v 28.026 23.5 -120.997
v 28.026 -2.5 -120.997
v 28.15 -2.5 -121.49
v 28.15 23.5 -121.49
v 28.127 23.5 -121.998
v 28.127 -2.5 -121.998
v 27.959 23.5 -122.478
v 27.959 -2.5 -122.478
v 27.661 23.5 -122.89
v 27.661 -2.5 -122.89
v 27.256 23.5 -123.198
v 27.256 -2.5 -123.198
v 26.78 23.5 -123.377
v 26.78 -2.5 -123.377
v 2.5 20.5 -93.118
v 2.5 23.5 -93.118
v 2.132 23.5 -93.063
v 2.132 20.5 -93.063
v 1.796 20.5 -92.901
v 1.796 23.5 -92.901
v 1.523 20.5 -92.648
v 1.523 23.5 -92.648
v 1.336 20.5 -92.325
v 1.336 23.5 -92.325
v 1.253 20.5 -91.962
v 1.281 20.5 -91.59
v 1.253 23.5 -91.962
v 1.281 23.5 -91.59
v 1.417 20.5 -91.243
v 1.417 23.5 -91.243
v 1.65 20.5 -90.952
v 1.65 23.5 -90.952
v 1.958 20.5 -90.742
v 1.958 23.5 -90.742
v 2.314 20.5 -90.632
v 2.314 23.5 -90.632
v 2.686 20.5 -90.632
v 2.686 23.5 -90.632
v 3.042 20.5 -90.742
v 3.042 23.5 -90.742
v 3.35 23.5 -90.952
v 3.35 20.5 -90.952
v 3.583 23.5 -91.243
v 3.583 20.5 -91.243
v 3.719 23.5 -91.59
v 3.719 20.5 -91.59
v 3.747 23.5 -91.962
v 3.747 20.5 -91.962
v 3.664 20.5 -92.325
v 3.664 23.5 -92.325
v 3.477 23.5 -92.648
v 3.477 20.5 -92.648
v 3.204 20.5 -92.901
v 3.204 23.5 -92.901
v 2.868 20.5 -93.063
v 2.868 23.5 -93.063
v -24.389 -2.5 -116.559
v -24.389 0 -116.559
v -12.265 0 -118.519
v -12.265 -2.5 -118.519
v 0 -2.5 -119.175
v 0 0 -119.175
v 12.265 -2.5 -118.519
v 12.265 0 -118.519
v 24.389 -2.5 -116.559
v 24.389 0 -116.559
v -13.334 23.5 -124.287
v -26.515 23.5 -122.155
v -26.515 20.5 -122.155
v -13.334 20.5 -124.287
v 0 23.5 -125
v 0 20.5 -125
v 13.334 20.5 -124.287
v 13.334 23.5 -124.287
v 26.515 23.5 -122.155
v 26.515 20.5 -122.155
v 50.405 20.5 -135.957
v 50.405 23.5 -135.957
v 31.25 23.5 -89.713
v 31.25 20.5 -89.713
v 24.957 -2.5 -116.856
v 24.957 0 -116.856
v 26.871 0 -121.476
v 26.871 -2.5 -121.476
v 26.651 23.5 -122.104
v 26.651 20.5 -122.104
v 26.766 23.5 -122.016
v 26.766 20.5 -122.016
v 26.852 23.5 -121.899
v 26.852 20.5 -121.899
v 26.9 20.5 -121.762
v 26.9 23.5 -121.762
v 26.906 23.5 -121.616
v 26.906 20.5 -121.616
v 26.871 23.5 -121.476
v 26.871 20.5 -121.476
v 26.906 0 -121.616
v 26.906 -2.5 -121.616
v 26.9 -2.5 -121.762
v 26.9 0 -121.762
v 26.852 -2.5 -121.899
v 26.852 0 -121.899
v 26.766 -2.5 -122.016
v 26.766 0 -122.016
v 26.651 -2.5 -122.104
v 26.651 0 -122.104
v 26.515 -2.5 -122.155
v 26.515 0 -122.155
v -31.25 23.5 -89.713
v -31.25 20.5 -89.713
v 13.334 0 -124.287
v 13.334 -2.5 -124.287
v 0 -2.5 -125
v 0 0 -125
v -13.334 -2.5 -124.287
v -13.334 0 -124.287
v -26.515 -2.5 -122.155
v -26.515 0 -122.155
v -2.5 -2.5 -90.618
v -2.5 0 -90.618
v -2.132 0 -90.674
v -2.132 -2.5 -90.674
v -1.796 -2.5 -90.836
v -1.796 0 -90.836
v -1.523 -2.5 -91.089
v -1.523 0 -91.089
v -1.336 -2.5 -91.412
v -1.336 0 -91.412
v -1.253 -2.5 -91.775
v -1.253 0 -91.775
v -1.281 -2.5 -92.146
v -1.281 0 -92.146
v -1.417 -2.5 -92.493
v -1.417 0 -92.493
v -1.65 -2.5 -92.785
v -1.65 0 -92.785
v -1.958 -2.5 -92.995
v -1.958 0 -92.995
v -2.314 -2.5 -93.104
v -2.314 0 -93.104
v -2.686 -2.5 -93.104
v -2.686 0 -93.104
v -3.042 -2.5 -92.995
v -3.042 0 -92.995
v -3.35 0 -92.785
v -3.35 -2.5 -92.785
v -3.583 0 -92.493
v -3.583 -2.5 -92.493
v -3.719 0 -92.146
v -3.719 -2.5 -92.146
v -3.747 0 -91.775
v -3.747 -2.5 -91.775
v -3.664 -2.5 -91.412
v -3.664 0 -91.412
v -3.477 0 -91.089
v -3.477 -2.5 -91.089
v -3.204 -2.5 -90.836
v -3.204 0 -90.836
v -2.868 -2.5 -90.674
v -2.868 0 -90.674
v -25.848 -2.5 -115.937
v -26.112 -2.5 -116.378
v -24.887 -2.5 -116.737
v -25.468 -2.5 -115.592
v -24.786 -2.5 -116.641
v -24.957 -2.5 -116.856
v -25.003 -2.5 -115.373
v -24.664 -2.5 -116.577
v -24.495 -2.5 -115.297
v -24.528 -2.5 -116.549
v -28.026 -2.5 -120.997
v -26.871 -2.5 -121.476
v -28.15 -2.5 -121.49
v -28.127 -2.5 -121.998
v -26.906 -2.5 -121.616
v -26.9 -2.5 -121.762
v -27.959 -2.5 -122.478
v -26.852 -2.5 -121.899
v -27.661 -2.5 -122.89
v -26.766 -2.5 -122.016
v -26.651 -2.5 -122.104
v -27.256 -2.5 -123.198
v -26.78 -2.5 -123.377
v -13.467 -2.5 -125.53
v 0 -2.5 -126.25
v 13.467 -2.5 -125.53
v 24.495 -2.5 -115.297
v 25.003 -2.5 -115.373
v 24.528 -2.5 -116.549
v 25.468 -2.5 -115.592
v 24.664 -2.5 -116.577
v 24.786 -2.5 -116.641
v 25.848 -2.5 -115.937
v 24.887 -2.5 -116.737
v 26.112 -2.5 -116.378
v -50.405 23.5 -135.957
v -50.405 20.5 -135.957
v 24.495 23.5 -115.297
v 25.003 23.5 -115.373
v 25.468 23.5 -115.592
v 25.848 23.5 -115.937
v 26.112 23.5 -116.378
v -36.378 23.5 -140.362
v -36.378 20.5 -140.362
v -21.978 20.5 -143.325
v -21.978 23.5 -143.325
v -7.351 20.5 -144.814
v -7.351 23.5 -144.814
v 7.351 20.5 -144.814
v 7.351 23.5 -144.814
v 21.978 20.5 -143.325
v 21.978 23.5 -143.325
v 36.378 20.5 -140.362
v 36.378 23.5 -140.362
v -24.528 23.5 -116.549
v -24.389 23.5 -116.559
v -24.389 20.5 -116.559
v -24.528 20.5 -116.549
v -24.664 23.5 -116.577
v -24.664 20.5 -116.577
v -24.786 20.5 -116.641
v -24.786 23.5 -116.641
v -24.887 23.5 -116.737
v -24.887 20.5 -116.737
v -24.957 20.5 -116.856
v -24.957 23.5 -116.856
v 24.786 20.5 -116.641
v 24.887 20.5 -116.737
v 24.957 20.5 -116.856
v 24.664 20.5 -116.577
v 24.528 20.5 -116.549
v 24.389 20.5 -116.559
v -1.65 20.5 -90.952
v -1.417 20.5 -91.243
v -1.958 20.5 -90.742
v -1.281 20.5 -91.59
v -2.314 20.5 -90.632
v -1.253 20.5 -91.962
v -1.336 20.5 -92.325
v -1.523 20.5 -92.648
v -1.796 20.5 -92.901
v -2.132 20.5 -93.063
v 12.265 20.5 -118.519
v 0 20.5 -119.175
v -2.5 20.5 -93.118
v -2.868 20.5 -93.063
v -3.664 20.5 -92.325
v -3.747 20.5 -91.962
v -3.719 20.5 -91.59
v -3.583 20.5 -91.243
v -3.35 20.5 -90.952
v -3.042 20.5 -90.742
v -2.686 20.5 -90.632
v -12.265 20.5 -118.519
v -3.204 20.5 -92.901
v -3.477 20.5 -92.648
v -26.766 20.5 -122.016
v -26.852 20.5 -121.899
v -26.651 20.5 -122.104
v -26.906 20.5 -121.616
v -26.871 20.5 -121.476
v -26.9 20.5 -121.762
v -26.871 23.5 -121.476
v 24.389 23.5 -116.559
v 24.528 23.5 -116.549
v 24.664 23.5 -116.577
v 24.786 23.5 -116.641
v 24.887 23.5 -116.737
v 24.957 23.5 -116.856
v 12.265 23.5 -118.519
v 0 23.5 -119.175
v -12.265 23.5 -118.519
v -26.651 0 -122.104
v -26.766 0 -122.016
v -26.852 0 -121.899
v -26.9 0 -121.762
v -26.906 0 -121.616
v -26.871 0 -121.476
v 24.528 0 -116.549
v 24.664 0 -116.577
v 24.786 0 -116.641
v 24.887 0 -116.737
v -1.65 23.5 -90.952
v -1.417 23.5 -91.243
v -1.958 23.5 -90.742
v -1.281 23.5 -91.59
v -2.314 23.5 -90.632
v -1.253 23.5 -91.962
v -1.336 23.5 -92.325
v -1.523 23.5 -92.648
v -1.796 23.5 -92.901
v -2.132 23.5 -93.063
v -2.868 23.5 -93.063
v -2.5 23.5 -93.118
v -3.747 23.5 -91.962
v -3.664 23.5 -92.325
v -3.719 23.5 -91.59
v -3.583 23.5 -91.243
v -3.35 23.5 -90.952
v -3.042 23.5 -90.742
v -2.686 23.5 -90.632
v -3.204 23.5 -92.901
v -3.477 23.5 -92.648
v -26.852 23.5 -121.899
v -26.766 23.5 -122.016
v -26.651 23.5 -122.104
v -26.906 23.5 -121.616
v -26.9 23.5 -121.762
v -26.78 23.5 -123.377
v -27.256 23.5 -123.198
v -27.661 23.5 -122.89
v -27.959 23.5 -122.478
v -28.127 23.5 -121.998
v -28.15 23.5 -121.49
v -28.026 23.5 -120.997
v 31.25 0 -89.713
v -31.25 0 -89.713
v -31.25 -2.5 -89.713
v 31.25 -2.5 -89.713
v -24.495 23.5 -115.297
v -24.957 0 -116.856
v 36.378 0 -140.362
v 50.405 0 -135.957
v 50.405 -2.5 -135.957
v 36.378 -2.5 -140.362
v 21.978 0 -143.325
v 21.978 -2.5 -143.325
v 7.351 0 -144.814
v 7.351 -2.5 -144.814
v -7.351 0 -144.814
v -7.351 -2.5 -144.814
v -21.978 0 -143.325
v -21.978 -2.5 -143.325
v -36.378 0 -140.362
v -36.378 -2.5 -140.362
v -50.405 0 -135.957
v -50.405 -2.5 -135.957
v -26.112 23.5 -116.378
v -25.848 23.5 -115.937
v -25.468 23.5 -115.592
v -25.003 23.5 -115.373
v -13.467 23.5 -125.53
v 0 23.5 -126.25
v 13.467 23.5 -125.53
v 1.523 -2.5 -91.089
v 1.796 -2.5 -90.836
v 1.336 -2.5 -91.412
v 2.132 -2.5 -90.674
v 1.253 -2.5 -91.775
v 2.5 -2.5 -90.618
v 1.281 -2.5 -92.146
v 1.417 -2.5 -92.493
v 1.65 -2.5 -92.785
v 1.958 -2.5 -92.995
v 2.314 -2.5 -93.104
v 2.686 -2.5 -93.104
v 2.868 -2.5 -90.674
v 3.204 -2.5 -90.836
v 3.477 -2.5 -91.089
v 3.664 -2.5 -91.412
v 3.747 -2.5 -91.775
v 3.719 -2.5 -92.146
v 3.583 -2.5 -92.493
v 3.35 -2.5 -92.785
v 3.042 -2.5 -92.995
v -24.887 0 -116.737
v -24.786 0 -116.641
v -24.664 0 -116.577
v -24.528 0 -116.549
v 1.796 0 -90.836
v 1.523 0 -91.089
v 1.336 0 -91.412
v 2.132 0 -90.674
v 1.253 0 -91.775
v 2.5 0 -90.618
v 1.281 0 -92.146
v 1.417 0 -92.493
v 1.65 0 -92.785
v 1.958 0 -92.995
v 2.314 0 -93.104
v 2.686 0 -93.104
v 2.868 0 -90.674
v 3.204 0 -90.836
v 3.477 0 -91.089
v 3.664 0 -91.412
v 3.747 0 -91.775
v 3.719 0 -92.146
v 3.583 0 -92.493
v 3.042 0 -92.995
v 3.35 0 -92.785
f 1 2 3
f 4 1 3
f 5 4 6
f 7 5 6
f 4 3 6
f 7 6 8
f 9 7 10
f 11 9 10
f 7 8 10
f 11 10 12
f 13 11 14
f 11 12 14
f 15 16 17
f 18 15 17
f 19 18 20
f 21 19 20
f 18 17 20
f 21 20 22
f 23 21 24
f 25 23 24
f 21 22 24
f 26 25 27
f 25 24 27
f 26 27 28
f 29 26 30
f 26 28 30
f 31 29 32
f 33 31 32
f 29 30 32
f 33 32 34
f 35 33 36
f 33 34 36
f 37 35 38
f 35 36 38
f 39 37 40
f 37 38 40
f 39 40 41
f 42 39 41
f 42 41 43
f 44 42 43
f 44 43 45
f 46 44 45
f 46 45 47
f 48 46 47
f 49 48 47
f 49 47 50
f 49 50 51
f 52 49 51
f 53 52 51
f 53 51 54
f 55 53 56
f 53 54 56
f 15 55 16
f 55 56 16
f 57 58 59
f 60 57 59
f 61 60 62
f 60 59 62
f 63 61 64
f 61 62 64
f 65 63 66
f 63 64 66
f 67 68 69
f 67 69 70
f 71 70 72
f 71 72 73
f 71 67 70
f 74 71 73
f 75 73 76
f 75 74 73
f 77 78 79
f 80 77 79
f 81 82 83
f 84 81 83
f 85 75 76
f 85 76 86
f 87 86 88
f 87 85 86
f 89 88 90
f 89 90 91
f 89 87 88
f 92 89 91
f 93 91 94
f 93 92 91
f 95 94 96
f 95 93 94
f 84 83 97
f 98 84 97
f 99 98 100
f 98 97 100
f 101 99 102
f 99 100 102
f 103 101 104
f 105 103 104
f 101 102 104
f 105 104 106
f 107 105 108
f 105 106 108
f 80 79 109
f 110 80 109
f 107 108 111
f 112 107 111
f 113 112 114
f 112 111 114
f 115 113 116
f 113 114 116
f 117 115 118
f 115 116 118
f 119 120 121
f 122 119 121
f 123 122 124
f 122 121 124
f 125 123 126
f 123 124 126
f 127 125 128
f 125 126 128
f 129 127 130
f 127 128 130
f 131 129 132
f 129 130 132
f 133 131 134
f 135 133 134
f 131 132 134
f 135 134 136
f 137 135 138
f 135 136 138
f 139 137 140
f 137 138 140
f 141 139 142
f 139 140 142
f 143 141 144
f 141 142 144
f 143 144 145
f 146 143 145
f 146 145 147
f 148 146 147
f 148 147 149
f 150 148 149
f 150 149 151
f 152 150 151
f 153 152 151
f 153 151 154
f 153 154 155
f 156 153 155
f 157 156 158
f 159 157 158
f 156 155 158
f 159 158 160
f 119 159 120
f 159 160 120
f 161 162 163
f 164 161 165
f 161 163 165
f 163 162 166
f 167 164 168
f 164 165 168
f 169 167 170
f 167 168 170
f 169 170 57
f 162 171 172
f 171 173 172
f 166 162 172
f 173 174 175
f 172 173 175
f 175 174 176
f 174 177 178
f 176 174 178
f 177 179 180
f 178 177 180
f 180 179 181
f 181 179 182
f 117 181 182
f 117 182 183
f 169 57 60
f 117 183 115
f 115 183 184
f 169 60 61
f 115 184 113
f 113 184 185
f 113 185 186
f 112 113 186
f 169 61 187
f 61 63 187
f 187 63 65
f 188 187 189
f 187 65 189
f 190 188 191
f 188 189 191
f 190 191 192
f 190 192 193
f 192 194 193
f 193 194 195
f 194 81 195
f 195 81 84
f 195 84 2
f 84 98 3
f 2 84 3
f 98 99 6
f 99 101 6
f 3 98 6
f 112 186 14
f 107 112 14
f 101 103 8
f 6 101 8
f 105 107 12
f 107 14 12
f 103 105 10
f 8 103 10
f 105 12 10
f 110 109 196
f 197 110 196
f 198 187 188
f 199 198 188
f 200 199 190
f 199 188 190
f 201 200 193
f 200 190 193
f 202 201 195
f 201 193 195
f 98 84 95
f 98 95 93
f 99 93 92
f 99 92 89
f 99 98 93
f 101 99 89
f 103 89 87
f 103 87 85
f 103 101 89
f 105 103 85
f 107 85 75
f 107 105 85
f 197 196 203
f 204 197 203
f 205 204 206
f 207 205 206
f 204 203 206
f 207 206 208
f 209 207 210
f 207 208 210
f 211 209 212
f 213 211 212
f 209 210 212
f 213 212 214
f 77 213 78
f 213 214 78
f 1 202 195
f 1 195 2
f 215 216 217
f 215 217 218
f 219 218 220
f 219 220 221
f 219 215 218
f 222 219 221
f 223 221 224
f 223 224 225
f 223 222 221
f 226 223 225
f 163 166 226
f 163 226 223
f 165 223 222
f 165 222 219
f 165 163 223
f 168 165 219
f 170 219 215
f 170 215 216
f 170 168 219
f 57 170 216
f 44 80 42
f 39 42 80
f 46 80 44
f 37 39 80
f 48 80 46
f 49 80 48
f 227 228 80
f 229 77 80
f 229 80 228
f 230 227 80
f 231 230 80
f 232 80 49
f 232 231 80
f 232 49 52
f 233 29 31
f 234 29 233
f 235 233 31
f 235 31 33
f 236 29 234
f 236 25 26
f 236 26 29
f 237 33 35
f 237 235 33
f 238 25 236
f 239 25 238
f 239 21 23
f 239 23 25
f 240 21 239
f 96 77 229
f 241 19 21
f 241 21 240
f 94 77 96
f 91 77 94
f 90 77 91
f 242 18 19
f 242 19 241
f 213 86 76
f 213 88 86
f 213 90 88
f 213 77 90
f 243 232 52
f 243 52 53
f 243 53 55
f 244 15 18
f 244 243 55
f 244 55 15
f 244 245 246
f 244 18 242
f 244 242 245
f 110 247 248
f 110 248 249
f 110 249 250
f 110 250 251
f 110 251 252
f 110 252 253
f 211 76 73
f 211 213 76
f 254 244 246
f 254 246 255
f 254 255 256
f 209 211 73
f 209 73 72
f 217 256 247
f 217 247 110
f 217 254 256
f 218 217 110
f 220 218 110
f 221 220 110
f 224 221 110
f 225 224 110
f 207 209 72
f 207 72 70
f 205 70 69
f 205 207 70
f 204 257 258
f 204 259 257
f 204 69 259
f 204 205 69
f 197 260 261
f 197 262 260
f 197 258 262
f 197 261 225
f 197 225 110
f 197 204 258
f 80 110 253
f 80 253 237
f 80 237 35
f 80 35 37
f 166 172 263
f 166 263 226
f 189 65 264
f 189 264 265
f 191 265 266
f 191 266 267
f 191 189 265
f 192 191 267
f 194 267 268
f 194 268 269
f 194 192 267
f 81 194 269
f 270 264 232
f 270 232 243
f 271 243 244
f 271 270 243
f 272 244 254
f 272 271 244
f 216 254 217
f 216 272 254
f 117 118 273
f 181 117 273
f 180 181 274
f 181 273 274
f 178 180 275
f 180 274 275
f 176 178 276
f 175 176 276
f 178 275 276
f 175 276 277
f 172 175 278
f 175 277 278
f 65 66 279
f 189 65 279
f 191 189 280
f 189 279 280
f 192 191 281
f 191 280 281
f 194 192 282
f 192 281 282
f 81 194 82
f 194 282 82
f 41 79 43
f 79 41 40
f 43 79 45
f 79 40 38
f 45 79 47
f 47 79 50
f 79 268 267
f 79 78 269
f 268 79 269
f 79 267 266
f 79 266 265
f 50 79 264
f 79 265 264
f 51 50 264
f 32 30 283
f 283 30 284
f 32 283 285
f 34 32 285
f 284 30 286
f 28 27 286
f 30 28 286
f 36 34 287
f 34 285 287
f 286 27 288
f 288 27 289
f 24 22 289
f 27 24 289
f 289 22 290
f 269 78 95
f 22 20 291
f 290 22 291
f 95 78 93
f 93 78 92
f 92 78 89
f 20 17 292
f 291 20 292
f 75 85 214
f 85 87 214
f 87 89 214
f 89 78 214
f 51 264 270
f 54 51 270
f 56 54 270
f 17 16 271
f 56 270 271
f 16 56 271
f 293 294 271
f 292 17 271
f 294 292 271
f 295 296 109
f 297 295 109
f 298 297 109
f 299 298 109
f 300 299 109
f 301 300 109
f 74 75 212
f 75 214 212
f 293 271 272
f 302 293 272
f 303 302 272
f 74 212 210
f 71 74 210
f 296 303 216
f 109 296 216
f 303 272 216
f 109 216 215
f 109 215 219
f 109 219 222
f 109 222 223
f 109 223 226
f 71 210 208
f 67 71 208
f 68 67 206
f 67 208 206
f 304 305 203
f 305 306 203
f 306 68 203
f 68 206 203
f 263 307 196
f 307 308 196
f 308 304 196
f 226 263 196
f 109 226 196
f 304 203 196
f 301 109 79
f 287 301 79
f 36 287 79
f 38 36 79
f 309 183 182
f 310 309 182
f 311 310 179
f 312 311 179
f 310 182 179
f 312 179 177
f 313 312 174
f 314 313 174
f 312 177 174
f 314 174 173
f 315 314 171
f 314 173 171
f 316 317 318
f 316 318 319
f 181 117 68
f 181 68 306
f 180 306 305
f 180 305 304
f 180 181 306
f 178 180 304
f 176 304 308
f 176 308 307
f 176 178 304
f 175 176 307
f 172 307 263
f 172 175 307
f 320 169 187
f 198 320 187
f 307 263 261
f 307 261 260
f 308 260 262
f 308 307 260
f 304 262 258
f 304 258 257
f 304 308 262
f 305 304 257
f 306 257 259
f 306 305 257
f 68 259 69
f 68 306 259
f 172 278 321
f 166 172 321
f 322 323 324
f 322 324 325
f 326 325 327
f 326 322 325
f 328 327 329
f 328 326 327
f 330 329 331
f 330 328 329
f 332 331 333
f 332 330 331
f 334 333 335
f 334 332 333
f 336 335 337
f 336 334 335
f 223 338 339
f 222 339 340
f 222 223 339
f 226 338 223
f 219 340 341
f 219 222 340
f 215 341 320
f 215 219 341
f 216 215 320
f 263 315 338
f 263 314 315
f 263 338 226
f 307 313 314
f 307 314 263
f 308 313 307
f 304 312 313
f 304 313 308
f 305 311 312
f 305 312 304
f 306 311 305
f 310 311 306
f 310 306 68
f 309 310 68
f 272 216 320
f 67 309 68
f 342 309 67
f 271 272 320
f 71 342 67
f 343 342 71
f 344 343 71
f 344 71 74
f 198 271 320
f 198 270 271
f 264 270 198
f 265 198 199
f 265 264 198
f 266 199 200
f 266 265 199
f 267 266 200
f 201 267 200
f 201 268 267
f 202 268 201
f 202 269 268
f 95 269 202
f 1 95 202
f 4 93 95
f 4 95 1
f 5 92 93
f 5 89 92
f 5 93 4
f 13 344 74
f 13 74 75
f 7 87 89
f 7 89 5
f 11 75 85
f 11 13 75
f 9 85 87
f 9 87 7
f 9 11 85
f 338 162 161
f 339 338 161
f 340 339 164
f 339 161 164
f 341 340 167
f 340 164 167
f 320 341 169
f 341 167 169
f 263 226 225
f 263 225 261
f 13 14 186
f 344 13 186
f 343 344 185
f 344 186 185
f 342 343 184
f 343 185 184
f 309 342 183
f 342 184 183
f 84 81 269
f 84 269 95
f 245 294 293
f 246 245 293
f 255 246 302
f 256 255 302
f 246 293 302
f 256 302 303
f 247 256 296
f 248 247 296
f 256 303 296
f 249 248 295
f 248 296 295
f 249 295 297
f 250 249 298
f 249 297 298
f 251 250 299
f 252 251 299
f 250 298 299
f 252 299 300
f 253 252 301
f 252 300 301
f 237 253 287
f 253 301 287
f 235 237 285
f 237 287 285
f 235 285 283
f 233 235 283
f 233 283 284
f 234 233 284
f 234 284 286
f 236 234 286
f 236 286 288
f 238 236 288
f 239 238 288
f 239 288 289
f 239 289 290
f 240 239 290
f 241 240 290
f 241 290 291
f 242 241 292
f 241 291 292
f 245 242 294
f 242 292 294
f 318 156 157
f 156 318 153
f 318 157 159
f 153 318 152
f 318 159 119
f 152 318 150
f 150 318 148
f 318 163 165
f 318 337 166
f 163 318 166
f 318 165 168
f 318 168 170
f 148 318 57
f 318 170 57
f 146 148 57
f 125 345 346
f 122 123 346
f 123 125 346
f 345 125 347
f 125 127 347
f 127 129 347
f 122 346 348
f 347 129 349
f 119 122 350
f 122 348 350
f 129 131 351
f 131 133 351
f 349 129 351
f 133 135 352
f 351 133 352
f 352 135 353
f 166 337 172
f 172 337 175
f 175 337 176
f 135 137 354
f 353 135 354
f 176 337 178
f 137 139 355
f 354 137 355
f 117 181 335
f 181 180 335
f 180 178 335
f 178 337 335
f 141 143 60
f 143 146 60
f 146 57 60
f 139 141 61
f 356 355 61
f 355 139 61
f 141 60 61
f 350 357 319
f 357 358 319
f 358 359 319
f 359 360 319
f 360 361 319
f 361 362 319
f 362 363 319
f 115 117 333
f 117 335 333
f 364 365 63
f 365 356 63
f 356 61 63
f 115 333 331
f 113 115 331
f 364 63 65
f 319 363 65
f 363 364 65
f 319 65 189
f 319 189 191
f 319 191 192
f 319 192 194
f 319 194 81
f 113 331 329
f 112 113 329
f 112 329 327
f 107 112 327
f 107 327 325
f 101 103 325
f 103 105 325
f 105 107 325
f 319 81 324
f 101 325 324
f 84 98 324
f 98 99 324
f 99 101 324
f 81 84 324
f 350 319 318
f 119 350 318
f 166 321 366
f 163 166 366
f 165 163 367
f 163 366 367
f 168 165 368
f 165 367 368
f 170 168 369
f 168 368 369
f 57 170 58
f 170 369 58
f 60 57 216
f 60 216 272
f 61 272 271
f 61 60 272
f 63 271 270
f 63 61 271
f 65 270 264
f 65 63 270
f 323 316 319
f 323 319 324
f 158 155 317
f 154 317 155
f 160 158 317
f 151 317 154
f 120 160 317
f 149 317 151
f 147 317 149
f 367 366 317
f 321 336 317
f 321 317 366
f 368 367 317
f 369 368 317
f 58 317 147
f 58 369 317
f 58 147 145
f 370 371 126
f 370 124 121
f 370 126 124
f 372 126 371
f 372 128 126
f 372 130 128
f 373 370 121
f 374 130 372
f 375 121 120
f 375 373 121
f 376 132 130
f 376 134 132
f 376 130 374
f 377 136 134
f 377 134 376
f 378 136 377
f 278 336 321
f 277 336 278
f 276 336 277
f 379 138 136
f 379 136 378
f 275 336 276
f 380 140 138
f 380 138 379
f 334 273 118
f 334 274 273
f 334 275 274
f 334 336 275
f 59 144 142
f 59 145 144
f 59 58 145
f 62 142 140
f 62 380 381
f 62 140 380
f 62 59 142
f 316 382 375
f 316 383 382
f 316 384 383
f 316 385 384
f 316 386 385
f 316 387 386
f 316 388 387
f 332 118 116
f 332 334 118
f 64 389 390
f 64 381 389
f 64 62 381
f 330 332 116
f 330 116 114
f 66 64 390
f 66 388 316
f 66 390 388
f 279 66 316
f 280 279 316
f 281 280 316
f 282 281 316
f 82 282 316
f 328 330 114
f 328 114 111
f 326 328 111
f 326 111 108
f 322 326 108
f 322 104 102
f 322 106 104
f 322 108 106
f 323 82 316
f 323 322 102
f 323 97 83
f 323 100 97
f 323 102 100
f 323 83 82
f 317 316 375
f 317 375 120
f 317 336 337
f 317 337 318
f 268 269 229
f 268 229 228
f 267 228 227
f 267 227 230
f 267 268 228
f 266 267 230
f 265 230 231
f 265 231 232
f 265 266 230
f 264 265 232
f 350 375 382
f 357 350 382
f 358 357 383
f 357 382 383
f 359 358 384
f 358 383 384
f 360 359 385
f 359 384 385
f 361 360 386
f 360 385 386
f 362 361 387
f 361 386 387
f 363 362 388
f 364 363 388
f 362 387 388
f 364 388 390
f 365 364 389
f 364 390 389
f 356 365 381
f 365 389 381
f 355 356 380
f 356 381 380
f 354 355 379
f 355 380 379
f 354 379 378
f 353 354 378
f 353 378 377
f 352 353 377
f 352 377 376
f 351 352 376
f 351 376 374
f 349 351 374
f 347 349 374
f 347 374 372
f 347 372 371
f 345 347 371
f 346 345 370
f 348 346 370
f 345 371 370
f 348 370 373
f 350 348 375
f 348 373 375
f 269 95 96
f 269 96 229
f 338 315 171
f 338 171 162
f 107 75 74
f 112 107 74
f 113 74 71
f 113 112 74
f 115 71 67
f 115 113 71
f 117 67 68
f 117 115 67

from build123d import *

# Parameters (mm, degrees)
SKETCH1_R           = 1.25
BOSS_EXTRUDE1_DEPTH = 2.5
BOSS_EXTRUDE2_START = -2.5
BOSS_EXTRUDE2_DEPTH = 26
BOSS_EXTRUDE3_START = 23.5
SKETCH1_4_R         = 1.25
BOSS_EXTRUDE3_DEPTH = 3


with BuildPart() as part:
    # Sketch1 → Boss-Extrude1 (new body)
    with BuildSketch(Plane(origin=(0, 0, 0), x_dir=(1, 0, 0), z_dir=(0, 1, 0))):
        with BuildLine():
            Line((-50.40491586, 135.957141986), (-31.25, 89.71308433))
            Line((-31.25, 89.71308433), (31.25, 89.71308433))
            Line((31.25, 89.71308433), (50.40491586, 135.957141986))
            ThreePointArc((50.40491586, 135.957141986), (0, 145), (-50.40491586, 135.957141986))
        make_face()
        with Locations(Location((-2.5, 91.868329805, 0), (0, 0, 270))):
            Circle(SKETCH1_R, mode=Mode.SUBTRACT)
        with Locations(Location((2.5, 91.868329805, 0), (0, 0, 270))):
            Circle(SKETCH1_R, mode=Mode.SUBTRACT)
        with BuildLine():
            Line((-26.870747539, 121.475518488), (-24.957330377, 116.856120826))
            ThreePointArc((-24.957330377, 116.856120826), (-24.727253788, 116.604473302), (-24.389349959, 116.558836529))
            ThreePointArc((-24.389349959, 116.558836529), (0, 119.174853647), (24.389349959, 116.558836529))
            ThreePointArc((24.389349959, 116.558836529), (24.727253788, 116.604473302), (24.957330377, 116.856120826))
            Line((24.957330377, 116.856120826), (26.870747539, 121.475518488))
            ThreePointArc((26.870747539, 121.475518488), (26.851801477, 121.898714852), (26.514867242, 122.155482133))
            ThreePointArc((26.514867242, 122.155482133), (0, 125), (-26.514867242, 122.155482133))
            ThreePointArc((-26.514867242, 122.155482133), (-26.851801477, 121.898714852), (-26.870747539, 121.475518488))
        make_face(mode=Mode.SUBTRACT)
    extrude(amount=-BOSS_EXTRUDE1_DEPTH)


with BuildPart() as body_2:
    # Sketch1<3> → Boss-Extrude2 (new body)
    with BuildSketch(Plane(origin=(0, 0, 0), x_dir=(1, 0, 0), z_dir=(0, 1, 0)).offset(BOSS_EXTRUDE2_START)):
        with BuildLine():
            Line((-28.025596955, 120.997164198), (-26.112179793, 116.377766535))
            ThreePointArc((-26.112179793, 116.377766535), (-25.467638519, 115.59239072), (-24.495390611, 115.297462542))
            Line((-24.495390611, 115.297462542), (24.495390611, 115.297462542))
            ThreePointArc((24.495390611, 115.297462542), (25.467638519, 115.59239072), (26.112179793, 116.377766535))
            Line((26.112179793, 116.377766535), (28.025596955, 120.997164198))
            ThreePointArc((28.025596955, 120.997164198), (27.959285739, 122.478351471), (26.780015914, 123.377036954))
            ThreePointArc((26.780015914, 123.377036954), (0, 126.25), (-26.780015914, 123.377036954))
            ThreePointArc((-26.780015914, 123.377036954), (-27.959285739, 122.478351471), (-28.025596955, 120.997164198))
        make_face()
        with BuildLine():
            Line((-26.870747539, 121.475518488), (-24.957330377, 116.856120826))
            ThreePointArc((-24.957330377, 116.856120826), (-24.727253788, 116.604473302), (-24.389349959, 116.558836529))
            ThreePointArc((-24.389349959, 116.558836529), (0, 119.174853647), (24.389349959, 116.558836529))
            ThreePointArc((24.389349959, 116.558836529), (24.727253788, 116.604473302), (24.957330377, 116.856120826))
            Line((24.957330377, 116.856120826), (26.870747539, 121.475518488))
            ThreePointArc((26.870747539, 121.475518488), (26.851801477, 121.898714852), (26.514867242, 122.155482133))
            ThreePointArc((26.514867242, 122.155482133), (0, 125), (-26.514867242, 122.155482133))
            ThreePointArc((-26.514867242, 122.155482133), (-26.851801477, 121.898714852), (-26.870747539, 121.475518488))
        make_face(mode=Mode.SUBTRACT)
    extrude(amount=BOSS_EXTRUDE2_DEPTH)


with BuildPart() as body_3:
    # Sketch1<4> → Boss-Extrude3 (new body)
    # profile 1 of 2: a face of its own
    with BuildSketch(Plane(origin=(0, 0, 0), x_dir=(1, 0, 0), z_dir=(0, 1, 0)).offset(BOSS_EXTRUDE3_START)):
        with BuildLine():
            ThreePointArc((-50.40491586, 135.957141986), (0, 145), (50.40491586, 135.957141986))
            Line((50.40491586, 135.957141986), (31.25, 89.71308433))
            Line((31.25, 89.71308433), (-31.25, 89.71308433))
            Line((-31.25, 89.71308433), (-50.40491586, 135.957141986))
        make_face()
        with Locations(Location((2.5, 91.868329805, 0), (0, 0, 90))):
            Circle(SKETCH1_4_R, mode=Mode.SUBTRACT)
        with Locations(Location((-2.5, 91.868329805, 0), (0, 0, 90))):
            Circle(SKETCH1_4_R, mode=Mode.SUBTRACT)
        with BuildLine():
            Line((-28.025596955, 120.997164198), (-26.112179793, 116.377766535))
            ThreePointArc((-26.112179793, 116.377766535), (-25.467638519, 115.59239072), (-24.495390611, 115.297462542))
            Line((-24.495390611, 115.297462542), (24.495390611, 115.297462542))
            ThreePointArc((24.495390611, 115.297462542), (25.467638519, 115.59239072), (26.112179793, 116.377766535))
            Line((26.112179793, 116.377766535), (28.025596955, 120.997164198))
            ThreePointArc((28.025596955, 120.997164198), (27.959285739, 122.478351471), (26.780015914, 123.377036954))
            ThreePointArc((26.780015914, 123.377036954), (0, 126.25), (-26.780015914, 123.377036954))
            ThreePointArc((-26.780015914, 123.377036954), (-27.959285739, 122.478351471), (-28.025596955, 120.997164198))
        make_face(mode=Mode.SUBTRACT)
    # profile 2 of 2: a face of its own
    with BuildSketch(Plane(origin=(0, 0, 0), x_dir=(1, 0, 0), z_dir=(0, 1, 0)).offset(BOSS_EXTRUDE3_START)):
        with BuildLine():
            ThreePointArc((-28.025596955, 120.997164198), (-27.959285739, 122.478351471), (-26.780015914, 123.377036954))
            ThreePointArc((-26.780015914, 123.377036954), (0, 126.25), (26.780015914, 123.377036954))
            ThreePointArc((26.780015914, 123.377036954), (27.959285739, 122.478351471), (28.025596955, 120.997164198))
            Line((28.025596955, 120.997164198), (26.112179793, 116.377766535))
            ThreePointArc((26.112179793, 116.377766535), (25.467638519, 115.59239072), (24.495390611, 115.297462542))
            Line((24.495390611, 115.297462542), (-24.495390611, 115.297462542))
            ThreePointArc((-24.495390611, 115.297462542), (-25.467638519, 115.59239072), (-26.112179793, 116.377766535))
            Line((-26.112179793, 116.377766535), (-28.025596955, 120.997164198))
        make_face()
        with BuildLine():
            Line((26.870747539, 121.475518488), (24.957330377, 116.856120826))
            ThreePointArc((24.957330377, 116.856120826), (24.727253788, 116.604473302), (24.389349959, 116.558836529))
            ThreePointArc((24.389349959, 116.558836529), (0, 119.174853647), (-24.389349959, 116.558836529))
            ThreePointArc((-24.389349959, 116.558836529), (-24.727253788, 116.604473302), (-24.957330377, 116.856120826))
            Line((-24.957330377, 116.856120826), (-26.870747539, 121.475518488))
            ThreePointArc((-26.870747539, 121.475518488), (-26.851801477, 121.898714852), (-26.514867242, 122.155482133))
            ThreePointArc((-26.514867242, 122.155482133), (0, 125), (26.514867242, 122.155482133))
            ThreePointArc((26.514867242, 122.155482133), (26.851801477, 121.898714852), (26.870747539, 121.475518488))
        make_face(mode=Mode.SUBTRACT)
    extrude(amount=-BOSS_EXTRUDE3_DEPTH)


solid = Compound([part.part, body_2.part, body_3.part])
